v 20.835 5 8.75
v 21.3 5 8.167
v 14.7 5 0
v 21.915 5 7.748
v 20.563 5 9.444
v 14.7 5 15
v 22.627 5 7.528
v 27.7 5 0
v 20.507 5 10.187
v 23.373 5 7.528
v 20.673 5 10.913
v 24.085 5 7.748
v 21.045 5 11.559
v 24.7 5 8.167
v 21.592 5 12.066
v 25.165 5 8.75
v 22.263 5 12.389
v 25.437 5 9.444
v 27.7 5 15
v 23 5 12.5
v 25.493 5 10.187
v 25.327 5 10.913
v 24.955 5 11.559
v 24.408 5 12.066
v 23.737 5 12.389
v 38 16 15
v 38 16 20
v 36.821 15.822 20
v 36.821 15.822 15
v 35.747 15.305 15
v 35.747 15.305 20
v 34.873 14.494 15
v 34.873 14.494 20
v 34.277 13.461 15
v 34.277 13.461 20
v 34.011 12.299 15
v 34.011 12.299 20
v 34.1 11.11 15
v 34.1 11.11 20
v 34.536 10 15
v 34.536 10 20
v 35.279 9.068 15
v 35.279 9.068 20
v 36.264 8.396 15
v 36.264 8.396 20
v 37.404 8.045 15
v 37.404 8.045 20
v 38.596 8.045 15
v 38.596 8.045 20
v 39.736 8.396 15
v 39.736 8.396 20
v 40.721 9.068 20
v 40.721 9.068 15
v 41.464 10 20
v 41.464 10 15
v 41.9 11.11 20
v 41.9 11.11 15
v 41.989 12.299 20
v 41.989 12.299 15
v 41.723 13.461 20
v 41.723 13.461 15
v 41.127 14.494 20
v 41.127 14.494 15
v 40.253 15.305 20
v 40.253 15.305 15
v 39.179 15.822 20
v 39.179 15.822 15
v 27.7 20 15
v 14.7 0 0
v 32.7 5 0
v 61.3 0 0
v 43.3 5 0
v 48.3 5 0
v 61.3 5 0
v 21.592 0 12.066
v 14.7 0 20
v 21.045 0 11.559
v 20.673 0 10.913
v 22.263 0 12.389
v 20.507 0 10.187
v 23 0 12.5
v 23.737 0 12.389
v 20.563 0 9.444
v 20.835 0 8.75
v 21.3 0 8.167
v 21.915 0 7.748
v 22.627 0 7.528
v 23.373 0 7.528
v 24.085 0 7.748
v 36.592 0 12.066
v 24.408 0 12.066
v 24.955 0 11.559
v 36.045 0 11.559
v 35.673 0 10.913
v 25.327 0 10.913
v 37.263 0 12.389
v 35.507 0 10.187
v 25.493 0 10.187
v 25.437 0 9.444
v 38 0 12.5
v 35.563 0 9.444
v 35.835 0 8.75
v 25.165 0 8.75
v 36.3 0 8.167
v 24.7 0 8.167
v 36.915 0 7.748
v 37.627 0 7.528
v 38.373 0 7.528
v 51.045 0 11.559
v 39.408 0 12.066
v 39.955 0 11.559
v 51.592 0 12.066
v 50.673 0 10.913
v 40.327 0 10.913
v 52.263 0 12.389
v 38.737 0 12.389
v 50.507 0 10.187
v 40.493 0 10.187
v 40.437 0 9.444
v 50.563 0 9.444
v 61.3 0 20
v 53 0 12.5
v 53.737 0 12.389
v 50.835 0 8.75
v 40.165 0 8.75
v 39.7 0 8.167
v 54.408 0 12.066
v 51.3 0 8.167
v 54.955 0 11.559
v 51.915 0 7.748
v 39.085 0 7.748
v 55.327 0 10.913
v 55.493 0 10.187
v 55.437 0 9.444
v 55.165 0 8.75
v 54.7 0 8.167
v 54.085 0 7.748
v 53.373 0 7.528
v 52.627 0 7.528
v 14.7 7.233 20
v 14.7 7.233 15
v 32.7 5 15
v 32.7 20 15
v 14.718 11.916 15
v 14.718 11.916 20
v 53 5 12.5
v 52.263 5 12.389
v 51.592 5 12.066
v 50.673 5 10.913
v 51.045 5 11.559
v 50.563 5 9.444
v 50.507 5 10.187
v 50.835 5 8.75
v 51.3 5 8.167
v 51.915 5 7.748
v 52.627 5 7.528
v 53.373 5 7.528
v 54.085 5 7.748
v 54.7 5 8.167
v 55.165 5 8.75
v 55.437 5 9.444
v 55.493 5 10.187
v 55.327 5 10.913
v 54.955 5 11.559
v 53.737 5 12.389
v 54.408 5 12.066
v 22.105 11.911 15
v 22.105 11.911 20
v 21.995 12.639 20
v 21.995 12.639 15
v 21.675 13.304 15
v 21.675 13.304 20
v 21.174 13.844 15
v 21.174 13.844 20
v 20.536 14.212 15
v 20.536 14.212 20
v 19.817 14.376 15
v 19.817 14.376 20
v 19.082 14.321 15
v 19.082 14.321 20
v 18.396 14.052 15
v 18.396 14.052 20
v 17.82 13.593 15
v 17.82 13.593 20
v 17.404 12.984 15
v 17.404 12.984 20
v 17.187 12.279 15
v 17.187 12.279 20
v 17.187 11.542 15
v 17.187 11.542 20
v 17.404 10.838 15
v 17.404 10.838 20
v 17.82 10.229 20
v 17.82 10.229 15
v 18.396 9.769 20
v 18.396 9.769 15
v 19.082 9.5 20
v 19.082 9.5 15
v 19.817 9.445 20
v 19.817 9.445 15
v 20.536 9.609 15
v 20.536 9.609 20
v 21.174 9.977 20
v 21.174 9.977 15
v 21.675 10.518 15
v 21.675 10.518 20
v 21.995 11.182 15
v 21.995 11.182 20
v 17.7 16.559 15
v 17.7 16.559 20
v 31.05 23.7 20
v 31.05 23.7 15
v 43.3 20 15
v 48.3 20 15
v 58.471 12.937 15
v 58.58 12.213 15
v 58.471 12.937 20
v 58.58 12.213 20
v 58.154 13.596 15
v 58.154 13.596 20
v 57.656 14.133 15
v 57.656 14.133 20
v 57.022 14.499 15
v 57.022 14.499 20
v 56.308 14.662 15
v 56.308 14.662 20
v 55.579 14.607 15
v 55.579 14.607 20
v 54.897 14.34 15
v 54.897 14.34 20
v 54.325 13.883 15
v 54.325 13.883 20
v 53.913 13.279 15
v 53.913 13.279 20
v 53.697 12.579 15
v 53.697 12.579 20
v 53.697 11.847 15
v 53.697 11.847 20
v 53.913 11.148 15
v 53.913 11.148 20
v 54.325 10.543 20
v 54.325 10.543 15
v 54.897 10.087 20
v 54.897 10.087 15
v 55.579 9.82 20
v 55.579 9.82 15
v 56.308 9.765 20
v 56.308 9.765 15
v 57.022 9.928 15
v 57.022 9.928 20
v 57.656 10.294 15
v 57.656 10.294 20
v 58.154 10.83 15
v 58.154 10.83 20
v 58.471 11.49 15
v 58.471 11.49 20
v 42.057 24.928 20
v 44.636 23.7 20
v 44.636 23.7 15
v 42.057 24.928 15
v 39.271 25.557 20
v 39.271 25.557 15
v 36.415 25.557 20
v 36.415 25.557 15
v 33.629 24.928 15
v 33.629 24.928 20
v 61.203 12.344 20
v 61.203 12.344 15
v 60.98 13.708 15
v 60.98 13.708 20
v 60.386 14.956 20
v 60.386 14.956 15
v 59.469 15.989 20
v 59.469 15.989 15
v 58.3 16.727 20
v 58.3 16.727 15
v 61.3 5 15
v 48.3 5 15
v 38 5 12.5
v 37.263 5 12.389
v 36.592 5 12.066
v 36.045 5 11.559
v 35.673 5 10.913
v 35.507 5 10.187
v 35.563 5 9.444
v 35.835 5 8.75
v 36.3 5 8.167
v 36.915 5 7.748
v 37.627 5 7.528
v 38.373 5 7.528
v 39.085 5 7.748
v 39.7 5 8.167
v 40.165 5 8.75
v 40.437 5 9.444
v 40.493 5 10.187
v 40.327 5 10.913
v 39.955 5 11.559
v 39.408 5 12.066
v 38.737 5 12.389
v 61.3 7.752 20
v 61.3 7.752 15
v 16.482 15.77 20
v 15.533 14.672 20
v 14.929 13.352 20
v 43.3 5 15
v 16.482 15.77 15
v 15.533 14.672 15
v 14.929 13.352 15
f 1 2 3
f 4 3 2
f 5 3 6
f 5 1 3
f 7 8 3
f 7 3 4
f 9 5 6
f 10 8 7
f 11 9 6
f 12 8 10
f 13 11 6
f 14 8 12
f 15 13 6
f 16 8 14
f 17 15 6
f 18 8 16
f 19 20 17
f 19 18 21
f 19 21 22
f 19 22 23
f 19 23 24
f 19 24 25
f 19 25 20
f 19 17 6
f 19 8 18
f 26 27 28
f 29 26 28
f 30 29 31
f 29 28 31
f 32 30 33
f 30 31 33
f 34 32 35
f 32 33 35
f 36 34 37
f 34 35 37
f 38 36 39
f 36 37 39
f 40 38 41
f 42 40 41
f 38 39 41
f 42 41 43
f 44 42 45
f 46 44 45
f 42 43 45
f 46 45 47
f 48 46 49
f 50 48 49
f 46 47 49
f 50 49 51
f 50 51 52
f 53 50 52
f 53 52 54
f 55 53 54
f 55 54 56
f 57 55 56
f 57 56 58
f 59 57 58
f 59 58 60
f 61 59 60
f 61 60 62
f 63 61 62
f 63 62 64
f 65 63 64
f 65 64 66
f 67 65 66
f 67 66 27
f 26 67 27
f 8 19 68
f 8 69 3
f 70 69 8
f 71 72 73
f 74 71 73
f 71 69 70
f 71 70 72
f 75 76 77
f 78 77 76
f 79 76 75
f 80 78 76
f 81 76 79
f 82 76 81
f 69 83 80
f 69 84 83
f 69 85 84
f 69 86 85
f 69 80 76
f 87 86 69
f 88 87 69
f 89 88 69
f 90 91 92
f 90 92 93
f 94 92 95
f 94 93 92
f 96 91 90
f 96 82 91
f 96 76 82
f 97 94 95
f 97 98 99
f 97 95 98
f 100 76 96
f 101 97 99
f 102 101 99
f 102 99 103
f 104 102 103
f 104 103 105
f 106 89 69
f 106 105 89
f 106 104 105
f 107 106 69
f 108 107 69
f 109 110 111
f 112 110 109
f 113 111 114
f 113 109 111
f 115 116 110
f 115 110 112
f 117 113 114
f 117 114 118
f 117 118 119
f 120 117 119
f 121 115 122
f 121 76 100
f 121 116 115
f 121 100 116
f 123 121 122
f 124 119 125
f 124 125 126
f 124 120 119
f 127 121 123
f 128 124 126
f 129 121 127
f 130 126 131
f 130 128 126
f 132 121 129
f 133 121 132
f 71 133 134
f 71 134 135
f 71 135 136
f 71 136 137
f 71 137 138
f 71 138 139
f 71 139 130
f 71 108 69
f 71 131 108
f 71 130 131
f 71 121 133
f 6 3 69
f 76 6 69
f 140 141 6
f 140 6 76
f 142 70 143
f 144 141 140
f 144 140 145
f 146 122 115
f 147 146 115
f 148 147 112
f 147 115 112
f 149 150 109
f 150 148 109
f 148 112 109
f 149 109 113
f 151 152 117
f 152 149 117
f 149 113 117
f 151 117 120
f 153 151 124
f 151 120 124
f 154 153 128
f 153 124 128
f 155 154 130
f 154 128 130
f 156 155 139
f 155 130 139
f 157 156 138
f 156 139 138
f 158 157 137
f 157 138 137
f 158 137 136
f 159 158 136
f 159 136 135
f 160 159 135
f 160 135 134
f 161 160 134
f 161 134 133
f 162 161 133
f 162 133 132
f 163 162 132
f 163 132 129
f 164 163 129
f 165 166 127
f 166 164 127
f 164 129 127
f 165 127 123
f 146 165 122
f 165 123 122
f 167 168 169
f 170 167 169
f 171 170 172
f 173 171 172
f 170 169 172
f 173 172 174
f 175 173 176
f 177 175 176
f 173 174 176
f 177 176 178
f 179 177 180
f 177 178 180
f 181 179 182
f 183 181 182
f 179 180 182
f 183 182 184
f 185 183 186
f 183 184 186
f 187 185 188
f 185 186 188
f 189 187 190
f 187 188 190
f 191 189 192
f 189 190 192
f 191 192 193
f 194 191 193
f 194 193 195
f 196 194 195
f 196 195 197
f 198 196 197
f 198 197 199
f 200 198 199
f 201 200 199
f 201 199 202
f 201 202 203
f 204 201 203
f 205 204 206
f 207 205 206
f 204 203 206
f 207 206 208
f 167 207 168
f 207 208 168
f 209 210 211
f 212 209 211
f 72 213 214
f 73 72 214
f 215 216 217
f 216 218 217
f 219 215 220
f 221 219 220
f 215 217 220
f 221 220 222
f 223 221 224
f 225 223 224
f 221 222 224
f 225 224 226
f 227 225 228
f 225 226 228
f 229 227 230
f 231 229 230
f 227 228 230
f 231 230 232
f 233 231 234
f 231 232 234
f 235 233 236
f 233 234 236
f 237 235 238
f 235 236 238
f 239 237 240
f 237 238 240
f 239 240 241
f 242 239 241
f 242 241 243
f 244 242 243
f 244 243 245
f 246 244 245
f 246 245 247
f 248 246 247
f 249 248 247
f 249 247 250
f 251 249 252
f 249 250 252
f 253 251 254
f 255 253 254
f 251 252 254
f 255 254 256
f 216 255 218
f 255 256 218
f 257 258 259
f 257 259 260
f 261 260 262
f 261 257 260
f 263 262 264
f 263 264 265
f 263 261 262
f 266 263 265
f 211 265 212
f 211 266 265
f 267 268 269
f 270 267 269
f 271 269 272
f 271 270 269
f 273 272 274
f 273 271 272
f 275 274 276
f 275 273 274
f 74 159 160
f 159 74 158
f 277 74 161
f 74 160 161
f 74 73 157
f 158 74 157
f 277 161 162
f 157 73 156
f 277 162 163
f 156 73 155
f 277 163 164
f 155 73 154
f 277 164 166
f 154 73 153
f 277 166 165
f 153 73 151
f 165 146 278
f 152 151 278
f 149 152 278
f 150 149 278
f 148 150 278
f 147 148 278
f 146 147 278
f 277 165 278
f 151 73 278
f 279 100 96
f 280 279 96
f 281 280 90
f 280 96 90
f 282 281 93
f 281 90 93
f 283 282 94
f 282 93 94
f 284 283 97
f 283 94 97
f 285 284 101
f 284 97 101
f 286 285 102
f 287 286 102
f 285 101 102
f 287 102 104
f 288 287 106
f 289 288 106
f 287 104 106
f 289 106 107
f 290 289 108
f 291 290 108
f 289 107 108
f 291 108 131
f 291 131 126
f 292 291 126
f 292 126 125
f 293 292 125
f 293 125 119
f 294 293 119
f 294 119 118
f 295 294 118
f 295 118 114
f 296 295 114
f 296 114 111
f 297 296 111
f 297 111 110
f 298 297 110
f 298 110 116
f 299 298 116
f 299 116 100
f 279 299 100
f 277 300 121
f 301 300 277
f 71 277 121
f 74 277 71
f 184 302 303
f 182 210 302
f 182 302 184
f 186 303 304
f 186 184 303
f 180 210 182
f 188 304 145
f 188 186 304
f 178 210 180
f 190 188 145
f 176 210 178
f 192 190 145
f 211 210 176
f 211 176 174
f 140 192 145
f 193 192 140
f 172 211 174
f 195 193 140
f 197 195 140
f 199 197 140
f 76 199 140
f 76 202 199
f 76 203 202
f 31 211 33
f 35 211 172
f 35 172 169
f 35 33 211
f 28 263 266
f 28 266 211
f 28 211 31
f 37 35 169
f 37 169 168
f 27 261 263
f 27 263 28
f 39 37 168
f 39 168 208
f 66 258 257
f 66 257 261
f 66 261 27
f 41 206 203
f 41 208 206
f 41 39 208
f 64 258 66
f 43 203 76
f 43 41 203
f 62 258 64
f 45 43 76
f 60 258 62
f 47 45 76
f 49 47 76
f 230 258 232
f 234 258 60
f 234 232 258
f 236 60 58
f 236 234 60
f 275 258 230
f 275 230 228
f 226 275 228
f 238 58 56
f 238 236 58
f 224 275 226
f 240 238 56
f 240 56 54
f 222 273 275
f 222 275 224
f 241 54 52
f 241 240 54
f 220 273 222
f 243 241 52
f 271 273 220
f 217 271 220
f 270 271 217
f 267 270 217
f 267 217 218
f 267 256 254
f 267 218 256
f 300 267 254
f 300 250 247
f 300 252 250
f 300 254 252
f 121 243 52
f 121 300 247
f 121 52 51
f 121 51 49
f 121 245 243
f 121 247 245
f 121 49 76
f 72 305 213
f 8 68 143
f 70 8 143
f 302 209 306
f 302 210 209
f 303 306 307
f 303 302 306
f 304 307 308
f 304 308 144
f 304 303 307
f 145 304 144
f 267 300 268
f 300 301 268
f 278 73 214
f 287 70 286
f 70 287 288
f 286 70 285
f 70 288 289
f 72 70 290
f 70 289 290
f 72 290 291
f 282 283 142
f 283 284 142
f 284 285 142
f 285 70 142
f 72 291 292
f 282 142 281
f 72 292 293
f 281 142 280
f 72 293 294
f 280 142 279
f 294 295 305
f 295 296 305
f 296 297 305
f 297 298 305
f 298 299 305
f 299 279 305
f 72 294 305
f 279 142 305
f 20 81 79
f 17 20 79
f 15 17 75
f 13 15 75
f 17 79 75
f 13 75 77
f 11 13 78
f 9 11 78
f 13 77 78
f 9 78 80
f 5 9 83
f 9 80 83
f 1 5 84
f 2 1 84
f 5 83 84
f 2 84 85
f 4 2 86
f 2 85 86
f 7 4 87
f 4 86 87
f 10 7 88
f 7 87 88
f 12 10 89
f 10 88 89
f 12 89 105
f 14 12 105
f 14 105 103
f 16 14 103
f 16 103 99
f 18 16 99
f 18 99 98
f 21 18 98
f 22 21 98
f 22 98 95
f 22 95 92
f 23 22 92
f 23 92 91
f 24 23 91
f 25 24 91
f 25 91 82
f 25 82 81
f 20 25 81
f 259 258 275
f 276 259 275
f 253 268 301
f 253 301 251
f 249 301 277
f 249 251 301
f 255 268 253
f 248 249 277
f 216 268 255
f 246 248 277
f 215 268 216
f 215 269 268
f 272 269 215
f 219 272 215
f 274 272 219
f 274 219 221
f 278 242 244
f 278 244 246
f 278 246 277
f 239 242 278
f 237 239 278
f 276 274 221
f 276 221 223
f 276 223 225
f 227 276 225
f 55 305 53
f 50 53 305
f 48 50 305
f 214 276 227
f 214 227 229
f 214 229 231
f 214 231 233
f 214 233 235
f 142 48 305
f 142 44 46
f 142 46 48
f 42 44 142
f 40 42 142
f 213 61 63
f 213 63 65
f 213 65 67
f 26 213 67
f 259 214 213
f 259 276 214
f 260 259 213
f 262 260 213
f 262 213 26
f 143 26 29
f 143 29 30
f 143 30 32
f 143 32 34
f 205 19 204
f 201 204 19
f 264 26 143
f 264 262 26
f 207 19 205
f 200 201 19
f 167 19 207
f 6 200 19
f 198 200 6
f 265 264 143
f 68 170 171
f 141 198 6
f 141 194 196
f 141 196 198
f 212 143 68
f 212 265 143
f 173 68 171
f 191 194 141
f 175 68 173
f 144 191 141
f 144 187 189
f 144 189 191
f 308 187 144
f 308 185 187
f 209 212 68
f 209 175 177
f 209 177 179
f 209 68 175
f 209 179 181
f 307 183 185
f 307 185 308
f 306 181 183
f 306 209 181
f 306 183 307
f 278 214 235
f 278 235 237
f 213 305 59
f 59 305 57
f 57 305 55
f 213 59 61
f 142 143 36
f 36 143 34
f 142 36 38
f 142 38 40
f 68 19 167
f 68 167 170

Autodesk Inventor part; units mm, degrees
ref_plane "YZ Plane" through (0, 0, 0) normal (1, 0, 0) x (0, 1, 0)
ref_plane "XZ Plane" through (0, 0, 0) normal (0, 1, 0) x (-1, 0, 0)
ref_plane "XY Plane" through (0, 0, 0) normal (0, 0, 1) x (1, 0, 0)
sketch "Sketch1" plane through (0, 0, 0) normal (0, 0, 1) x (1, 0, 0)
  line L0 (0, 0) -> (50, 0)
  line L1 (50, 0) -> (50, 50)
  line L2 (50, 50) -> (0, 0)
  dimension "d0" = 50
  dimension "d1" = 50
extrude "Extrusion1" add sketch "Sketch1" along normal blind 20
sketch "Sketch2" plane through (0, 0, 20) normal (0, 0, 1) x (1, 0, 0)
  line L0 (50, 50) -> (0, 0) projected
  line L1 (5, 5) -> (45, 5)
  line L2 (45, 5) -> (45, 45)
  line L3 (50, 0) -> (50, 50) projected
  line L4 (0, 0) -> (50, 0) projected
  dimension "d4" = 5
  dimension "d5" = 5
extrude "Extrusion2" cut sketch "Sketch2" against normal through all contours L2 L1 L0
extrude "Extrusion3" add sketch "Sketch2" against normal blind 5 contours L2 L1 L0
sketch "Sketch3" plane through (0, 0, 0) normal (0, 0, -1) x (-1, 0, 0)
  line L0 (-12.7, 0) -> (-50, 37.3)
  line L1 (-50, 0) -> (-50, 50) projected
  line L2 (-60.6675, 53.6604) -> (-50, 37.3)
  line L3 (-60.6675, 53.6604) -> (-37.4752, 61.571)
  line L4 (-37.4752, 61.571) -> (23.8314, -5.4888)
  line L5 (23.8314, -5.4888) -> (-5.9204, -12.6802)
  line L6 (-5.9204, -12.6802) -> (-12.7, 0)
  point P0 (0, 0)
  dimension "d12" = 12.7
  dimension "d13" = 12.7
extrude "Extrusion5" cut sketch "Sketch3" against normal through all
sketch "Sketch4" plane through (0, 0, 15) normal (0, 0, -1) x (-1, 0, 0)
  line L0 (-17.7, 5) -> (-45, 32.3) projected
  line L1 (-45, 5) -> (-45, 32.3) projected
  point P0 (0, 0)
  point P1 (-38, 12)
  dimension "d17" = 7
  dimension "d27" = 7
hole "Hole1" at (38, 12, 15) direction (0, 0, 1) diameter 8 depth 25.4 tip angle 118
sketch "Sketch5" plane through (45, 5, 0) normal (-1, 0, 0) x (0, 0, 1)
  line L0 (0, 0) -> (0, 27.3) projected
  line L1 (20, -5) -> (0, -5) projected
  point P0 (10, 22)
  point P1 (10, 7)
  dimension "d28" = 10
  dimension "d29" = 10
  dimension "d30" = 15
  dimension "d31" = 12
hole "Hole2" at (45, 27, 10) at (45, 12, 10) direction (1, 0, 0) diameter 5 depth 25.4 tip angle 118
sketch "Sketch6" plane through (45, 5, 15) normal (0, 1, 0) x (1, 0, 0)
  line L0 (-27.3, 15) -> (0, 15) projected
  line L1 (5, 15) -> (5, -5) projected
  point P0 (-45, 15)
  point P1 (-7, 5)
  point P2 (-22, 5)
  dimension "d39" = 15
  dimension "d40" = 10
  dimension "d41" = 10
  dimension "d42" = 12
hole "Hole3" at (38, 5, 10) at (23, 5, 10) direction (0, -1, 0) diameter 5 depth 25.4 tip angle 118
sketch "Sketch7" plane through (0, 0, 0) normal (0, 0, -1) x (-1, 0, 0)
  line L0 (-17.7, 5) -> (-17.7, 0)
  line L1 (-12.7, 0) -> (-50, 0) projected
  line L2 (-17.7, 0) -> (-12.7, 0)
  line L3 (-12.7, 0) -> (-17.7, 5)
  line L4 (-12.7, 0) -> (-17.7, 5) projected
  line L5 (-45, 32.3) -> (-50, 32.3)
  line L6 (-50, 0) -> (-50, 37.3) projected
  line L7 (-50, 32.3) -> (-50, 37.3)
  line L8 (-50, 37.3) -> (-45, 32.3)
  line L9 (-45, 32.3) -> (-50, 37.3) projected
  point P0 (0, 0)
extrude "Extrusion6" cut sketch "Sketch7" against normal blind 25.4
sketch "Sketch8" plane through (0, 0, 0) normal (0, 0, -1) x (-1, 0, 0)
  line L0 (-17.7, 0) -> (-50, 0) projected
  line L1 (-38, 0) -> (-60.6544, 0)
  line L2 (-60.6544, 0) -> (-60.6544, 37.4521)
  line L3 (-60.6544, 37.4521) -> (-38, 37.4521)
  line L4 (-38, 37.4521) -> (-38, 0)
  circle A0 centre (-38, 12) radius 4 projected
  point P0 (0, 0)
  dimension "d52" = 0
extrude "Extrusion7" cut sketch "Sketch8" against normal through all contours L0 L1 L2 L3 L4 A0 | A0 L4 picked at (-39.3236, 12.1607)
mirror "Mirror1" about plane through (38, 37.4521, 0) normal (1, 0, 0)
sketch "Sketch9" plane through (0, 0, 15) normal (0, 0, -1) x (-1, 0, 0)
  point P0 (0, 0)
fillet "Fillet1" radius 8 1 edges at (38, 25.3, 17.5)
sketch "Sketch10" plane through (0, 0, 20) normal (0, 0, 1) x (1, 0, 0)
  arc A0 (9.2418, 17.7) -> (17.7, 5) centre (17.0156, 13.7108) ccw
  arc A1 (58.3, 5) -> (66.7582, 17.7) centre (58.9844, 13.7108) ccw
  arc A2 (66.7582, 17.7) -> (9.2418, 17.7) centre (38, 2.9422) ccw
  line L0 (17.7, 5) -> (32.3431, 19.6431)
  line L1 (32.3431, 19.6431) -> (17.7, 5) projected
  line L2 (58.3, 5) -> (43.6569, 19.6431)
  arc A3 (43.6569, 19.6431) -> (32.3431, 19.6431) centre (38, 13.9863) ccw projected
  line L3 (58.3, 5) -> (43.6569, 19.6431) projected
  arc A4 (43.6569, 19.6431) -> (32.3431, 19.6431) centre (38, 13.9863) ccw
  point P0 (0, 0)
  dimension "d56" = 8.7376
  dimension "d57" = 8.4582
  dimension "d58" = 12.7
  dimension "d59" = 12.7
  dimension "d60" = 8.4582
  dimension "d61" = 0
extrude "Extrusion8" add sketch "Sketch10" against normal up to surface (5 mm away)
sketch "Sketch12" plane through (0, 0, 20) normal (0, 0, 1) x (1, 0, 0)
  arc A0 (17.7, 16.5588) -> (17.7, 7.2332) centre (19.8547, 11.896) ccw
  line L0 (17.7, 16.5588) -> (31.0503, 23.6999)
  arc A1 (44.6361, 23.6999) -> (31.0503, 23.6999) centre (37.8432, 12.753) ccw
  line L1 (58.3, 5) -> (63.7675, 1.1638)
  line L2 (63.7675, 1.1638) -> (73.9162, 6.1166)
  line L3 (73.9162, 6.1166) -> (79.7366, 33.6983)
  line L4 (79.7366, 33.6983) -> (40.092, 40.6944)
  line L5 (40.092, 40.6944) -> (0, 39.3618)
  line L6 (0, 39.3618) -> (-15.8768, 5)
  arc A2 (-15.8768, 5) -> (-14.2095, 1.1638) centre (-13.3336, 3.8249) ccw
  line L7 (-14.2095, 1.1638) -> (10.6084, -22.6037)
  line L8 (10.6084, -22.6037) -> (17.7, 5)
  line L9 (17.7, 7.2332) -> (17.7, 5)
  line L10 (58.3, 7.7519) -> (58.3, 5)
  line L11 (44.6361, 23.6999) -> (58.3, 16.7272)
  arc A3 (58.3, 7.7519) -> (58.3, 16.7272) centre (56.2845, 12.2396) ccw
  point P0 (0, 0)
extrude "Extrusion9" cut sketch "Sketch12" against normal through all
sketch "Sketch13" plane through (0, 0, 20) normal (0, 0, 1) x (1, 0, 0)
  circle A0 centre (19.6322, 11.9106) radius 2.4728
  circle A1 centre (56.125, 12.2133) radius 2.4552
  point P0 (0, 0)
extrude "Extrusion10" cut sketch "Sketch13" against normal blind 25.4
sketch "Sketch14" plane through (17.7, 5, 15) normal (0, 1, 0) x (1, 0, 0)
  line L0 (26.9361, 0) -> (13.3503, 0) projected
  line L1 (10, 15) -> (15, 15)
  line L2 (15, 15) -> (15, 0)
  line L3 (15, 0) -> (10, 0)
  line L4 (10, 0) -> (10, 15)
  line L5 (40.6, 15) -> (0, 15) projected
  line L6 (25.6, 15) -> (30.6, 15)
  line L7 (30.6, 15) -> (30.6, 0)
  line L8 (30.6, 0) -> (25.6, 0)
  line L9 (25.6, 0) -> (25.6, 15)
  line L10 (40.6, 15) -> (40.6, 0) projected
  line L11 (0, 15) -> (0, 0) projected
  point P0 (-17.7, 15)
  dimension "d51" = 0
  dimension "d83" = 10
  dimension "d84" = 5
  dimension "d85" = 10
  dimension "d86" = 5
extrude "Extrusion11" add sketch "Sketch14" along normal blind 15 contours L0 L9 L5 L7 L8 | L0 L3 L4 L1 L2
chamfer "Chamfer1" distance 15 angle 45 2 edges at (45.8, 20, 0) (30.2, 20, 0)
sketch "Sketch15" plane through (58.3, 0, 0) normal (1, 0, 0) x (0, 0, -1)
  line L0 (-20, 7.7519) -> (-20, 0) projected
  line L1 (-20, 0) -> (0, 0) projected
  line L2 (0, 0) -> (0, 5) projected
  line L3 (0, 5) -> (-15, 5) projected
  line L4 (-15, 7.7519) -> (-15, 5) projected
  line L5 (-20, 7.7519) -> (-15, 7.7519) projected
  point P0 (0, 0)
extrude "Extrusion12" add sketch "Sketch15" along normal blind 3
sketch "Sketch16" plane through (17.7, 0, 0) normal (-1, 0, 0) x (0, 0, 1)
  line L0 (20, 7.2332) -> (20, 0) projected
  line L1 (20, 7.2332) -> (15, 7.2332) projected
  line L2 (15, 5) -> (15, 7.2332) projected
  line L3 (0, 5) -> (15, 5) projected
  line L4 (0, 0) -> (0, 5) projected
  line L5 (20, 0) -> (0, 0) projected
extrude "Extrusion13" add sketch "Sketch16" along normal blind 3
sketch "Sketch17" plane through (0, 0, 15) normal (0, 0, -1) x (-1, 0, 0)
  line L0 (-14.7, 7.2332) -> (-14.7181, 11.916)
  arc A0 (-17.7, 7.2332) -> (-17.7, 16.5588) centre (-19.8547, 11.896) ccw projected
  line L1 (-14.7181, 11.916) -> (-19.0926, 6.6114)
  line L2 (-19.0926, 6.6114) -> (-14.7, 7.2332)
  line L3 (-61.3, 7.7519) -> (-61.2028, 12.3437)
  arc A1 (-58.3, 16.7272) -> (-58.3, 7.7519) centre (-56.2845, 12.2396) ccw projected
  line L4 (-61.2028, 12.3437) -> (-58.3, 7.7519)
  line L5 (-58.3, 7.7519) -> (-58.6002, 6.2246)
  line L6 (-58.6002, 6.2246) -> (-61.3, 7.7519)
  point P0 (0, 0)
extrude "Extrusion14" add sketch "Sketch17" against normal up to surface (5 mm away) contours L2 L1 L0 | L3 A1 L5 L6
properties part number "Leadscrew Mount"
